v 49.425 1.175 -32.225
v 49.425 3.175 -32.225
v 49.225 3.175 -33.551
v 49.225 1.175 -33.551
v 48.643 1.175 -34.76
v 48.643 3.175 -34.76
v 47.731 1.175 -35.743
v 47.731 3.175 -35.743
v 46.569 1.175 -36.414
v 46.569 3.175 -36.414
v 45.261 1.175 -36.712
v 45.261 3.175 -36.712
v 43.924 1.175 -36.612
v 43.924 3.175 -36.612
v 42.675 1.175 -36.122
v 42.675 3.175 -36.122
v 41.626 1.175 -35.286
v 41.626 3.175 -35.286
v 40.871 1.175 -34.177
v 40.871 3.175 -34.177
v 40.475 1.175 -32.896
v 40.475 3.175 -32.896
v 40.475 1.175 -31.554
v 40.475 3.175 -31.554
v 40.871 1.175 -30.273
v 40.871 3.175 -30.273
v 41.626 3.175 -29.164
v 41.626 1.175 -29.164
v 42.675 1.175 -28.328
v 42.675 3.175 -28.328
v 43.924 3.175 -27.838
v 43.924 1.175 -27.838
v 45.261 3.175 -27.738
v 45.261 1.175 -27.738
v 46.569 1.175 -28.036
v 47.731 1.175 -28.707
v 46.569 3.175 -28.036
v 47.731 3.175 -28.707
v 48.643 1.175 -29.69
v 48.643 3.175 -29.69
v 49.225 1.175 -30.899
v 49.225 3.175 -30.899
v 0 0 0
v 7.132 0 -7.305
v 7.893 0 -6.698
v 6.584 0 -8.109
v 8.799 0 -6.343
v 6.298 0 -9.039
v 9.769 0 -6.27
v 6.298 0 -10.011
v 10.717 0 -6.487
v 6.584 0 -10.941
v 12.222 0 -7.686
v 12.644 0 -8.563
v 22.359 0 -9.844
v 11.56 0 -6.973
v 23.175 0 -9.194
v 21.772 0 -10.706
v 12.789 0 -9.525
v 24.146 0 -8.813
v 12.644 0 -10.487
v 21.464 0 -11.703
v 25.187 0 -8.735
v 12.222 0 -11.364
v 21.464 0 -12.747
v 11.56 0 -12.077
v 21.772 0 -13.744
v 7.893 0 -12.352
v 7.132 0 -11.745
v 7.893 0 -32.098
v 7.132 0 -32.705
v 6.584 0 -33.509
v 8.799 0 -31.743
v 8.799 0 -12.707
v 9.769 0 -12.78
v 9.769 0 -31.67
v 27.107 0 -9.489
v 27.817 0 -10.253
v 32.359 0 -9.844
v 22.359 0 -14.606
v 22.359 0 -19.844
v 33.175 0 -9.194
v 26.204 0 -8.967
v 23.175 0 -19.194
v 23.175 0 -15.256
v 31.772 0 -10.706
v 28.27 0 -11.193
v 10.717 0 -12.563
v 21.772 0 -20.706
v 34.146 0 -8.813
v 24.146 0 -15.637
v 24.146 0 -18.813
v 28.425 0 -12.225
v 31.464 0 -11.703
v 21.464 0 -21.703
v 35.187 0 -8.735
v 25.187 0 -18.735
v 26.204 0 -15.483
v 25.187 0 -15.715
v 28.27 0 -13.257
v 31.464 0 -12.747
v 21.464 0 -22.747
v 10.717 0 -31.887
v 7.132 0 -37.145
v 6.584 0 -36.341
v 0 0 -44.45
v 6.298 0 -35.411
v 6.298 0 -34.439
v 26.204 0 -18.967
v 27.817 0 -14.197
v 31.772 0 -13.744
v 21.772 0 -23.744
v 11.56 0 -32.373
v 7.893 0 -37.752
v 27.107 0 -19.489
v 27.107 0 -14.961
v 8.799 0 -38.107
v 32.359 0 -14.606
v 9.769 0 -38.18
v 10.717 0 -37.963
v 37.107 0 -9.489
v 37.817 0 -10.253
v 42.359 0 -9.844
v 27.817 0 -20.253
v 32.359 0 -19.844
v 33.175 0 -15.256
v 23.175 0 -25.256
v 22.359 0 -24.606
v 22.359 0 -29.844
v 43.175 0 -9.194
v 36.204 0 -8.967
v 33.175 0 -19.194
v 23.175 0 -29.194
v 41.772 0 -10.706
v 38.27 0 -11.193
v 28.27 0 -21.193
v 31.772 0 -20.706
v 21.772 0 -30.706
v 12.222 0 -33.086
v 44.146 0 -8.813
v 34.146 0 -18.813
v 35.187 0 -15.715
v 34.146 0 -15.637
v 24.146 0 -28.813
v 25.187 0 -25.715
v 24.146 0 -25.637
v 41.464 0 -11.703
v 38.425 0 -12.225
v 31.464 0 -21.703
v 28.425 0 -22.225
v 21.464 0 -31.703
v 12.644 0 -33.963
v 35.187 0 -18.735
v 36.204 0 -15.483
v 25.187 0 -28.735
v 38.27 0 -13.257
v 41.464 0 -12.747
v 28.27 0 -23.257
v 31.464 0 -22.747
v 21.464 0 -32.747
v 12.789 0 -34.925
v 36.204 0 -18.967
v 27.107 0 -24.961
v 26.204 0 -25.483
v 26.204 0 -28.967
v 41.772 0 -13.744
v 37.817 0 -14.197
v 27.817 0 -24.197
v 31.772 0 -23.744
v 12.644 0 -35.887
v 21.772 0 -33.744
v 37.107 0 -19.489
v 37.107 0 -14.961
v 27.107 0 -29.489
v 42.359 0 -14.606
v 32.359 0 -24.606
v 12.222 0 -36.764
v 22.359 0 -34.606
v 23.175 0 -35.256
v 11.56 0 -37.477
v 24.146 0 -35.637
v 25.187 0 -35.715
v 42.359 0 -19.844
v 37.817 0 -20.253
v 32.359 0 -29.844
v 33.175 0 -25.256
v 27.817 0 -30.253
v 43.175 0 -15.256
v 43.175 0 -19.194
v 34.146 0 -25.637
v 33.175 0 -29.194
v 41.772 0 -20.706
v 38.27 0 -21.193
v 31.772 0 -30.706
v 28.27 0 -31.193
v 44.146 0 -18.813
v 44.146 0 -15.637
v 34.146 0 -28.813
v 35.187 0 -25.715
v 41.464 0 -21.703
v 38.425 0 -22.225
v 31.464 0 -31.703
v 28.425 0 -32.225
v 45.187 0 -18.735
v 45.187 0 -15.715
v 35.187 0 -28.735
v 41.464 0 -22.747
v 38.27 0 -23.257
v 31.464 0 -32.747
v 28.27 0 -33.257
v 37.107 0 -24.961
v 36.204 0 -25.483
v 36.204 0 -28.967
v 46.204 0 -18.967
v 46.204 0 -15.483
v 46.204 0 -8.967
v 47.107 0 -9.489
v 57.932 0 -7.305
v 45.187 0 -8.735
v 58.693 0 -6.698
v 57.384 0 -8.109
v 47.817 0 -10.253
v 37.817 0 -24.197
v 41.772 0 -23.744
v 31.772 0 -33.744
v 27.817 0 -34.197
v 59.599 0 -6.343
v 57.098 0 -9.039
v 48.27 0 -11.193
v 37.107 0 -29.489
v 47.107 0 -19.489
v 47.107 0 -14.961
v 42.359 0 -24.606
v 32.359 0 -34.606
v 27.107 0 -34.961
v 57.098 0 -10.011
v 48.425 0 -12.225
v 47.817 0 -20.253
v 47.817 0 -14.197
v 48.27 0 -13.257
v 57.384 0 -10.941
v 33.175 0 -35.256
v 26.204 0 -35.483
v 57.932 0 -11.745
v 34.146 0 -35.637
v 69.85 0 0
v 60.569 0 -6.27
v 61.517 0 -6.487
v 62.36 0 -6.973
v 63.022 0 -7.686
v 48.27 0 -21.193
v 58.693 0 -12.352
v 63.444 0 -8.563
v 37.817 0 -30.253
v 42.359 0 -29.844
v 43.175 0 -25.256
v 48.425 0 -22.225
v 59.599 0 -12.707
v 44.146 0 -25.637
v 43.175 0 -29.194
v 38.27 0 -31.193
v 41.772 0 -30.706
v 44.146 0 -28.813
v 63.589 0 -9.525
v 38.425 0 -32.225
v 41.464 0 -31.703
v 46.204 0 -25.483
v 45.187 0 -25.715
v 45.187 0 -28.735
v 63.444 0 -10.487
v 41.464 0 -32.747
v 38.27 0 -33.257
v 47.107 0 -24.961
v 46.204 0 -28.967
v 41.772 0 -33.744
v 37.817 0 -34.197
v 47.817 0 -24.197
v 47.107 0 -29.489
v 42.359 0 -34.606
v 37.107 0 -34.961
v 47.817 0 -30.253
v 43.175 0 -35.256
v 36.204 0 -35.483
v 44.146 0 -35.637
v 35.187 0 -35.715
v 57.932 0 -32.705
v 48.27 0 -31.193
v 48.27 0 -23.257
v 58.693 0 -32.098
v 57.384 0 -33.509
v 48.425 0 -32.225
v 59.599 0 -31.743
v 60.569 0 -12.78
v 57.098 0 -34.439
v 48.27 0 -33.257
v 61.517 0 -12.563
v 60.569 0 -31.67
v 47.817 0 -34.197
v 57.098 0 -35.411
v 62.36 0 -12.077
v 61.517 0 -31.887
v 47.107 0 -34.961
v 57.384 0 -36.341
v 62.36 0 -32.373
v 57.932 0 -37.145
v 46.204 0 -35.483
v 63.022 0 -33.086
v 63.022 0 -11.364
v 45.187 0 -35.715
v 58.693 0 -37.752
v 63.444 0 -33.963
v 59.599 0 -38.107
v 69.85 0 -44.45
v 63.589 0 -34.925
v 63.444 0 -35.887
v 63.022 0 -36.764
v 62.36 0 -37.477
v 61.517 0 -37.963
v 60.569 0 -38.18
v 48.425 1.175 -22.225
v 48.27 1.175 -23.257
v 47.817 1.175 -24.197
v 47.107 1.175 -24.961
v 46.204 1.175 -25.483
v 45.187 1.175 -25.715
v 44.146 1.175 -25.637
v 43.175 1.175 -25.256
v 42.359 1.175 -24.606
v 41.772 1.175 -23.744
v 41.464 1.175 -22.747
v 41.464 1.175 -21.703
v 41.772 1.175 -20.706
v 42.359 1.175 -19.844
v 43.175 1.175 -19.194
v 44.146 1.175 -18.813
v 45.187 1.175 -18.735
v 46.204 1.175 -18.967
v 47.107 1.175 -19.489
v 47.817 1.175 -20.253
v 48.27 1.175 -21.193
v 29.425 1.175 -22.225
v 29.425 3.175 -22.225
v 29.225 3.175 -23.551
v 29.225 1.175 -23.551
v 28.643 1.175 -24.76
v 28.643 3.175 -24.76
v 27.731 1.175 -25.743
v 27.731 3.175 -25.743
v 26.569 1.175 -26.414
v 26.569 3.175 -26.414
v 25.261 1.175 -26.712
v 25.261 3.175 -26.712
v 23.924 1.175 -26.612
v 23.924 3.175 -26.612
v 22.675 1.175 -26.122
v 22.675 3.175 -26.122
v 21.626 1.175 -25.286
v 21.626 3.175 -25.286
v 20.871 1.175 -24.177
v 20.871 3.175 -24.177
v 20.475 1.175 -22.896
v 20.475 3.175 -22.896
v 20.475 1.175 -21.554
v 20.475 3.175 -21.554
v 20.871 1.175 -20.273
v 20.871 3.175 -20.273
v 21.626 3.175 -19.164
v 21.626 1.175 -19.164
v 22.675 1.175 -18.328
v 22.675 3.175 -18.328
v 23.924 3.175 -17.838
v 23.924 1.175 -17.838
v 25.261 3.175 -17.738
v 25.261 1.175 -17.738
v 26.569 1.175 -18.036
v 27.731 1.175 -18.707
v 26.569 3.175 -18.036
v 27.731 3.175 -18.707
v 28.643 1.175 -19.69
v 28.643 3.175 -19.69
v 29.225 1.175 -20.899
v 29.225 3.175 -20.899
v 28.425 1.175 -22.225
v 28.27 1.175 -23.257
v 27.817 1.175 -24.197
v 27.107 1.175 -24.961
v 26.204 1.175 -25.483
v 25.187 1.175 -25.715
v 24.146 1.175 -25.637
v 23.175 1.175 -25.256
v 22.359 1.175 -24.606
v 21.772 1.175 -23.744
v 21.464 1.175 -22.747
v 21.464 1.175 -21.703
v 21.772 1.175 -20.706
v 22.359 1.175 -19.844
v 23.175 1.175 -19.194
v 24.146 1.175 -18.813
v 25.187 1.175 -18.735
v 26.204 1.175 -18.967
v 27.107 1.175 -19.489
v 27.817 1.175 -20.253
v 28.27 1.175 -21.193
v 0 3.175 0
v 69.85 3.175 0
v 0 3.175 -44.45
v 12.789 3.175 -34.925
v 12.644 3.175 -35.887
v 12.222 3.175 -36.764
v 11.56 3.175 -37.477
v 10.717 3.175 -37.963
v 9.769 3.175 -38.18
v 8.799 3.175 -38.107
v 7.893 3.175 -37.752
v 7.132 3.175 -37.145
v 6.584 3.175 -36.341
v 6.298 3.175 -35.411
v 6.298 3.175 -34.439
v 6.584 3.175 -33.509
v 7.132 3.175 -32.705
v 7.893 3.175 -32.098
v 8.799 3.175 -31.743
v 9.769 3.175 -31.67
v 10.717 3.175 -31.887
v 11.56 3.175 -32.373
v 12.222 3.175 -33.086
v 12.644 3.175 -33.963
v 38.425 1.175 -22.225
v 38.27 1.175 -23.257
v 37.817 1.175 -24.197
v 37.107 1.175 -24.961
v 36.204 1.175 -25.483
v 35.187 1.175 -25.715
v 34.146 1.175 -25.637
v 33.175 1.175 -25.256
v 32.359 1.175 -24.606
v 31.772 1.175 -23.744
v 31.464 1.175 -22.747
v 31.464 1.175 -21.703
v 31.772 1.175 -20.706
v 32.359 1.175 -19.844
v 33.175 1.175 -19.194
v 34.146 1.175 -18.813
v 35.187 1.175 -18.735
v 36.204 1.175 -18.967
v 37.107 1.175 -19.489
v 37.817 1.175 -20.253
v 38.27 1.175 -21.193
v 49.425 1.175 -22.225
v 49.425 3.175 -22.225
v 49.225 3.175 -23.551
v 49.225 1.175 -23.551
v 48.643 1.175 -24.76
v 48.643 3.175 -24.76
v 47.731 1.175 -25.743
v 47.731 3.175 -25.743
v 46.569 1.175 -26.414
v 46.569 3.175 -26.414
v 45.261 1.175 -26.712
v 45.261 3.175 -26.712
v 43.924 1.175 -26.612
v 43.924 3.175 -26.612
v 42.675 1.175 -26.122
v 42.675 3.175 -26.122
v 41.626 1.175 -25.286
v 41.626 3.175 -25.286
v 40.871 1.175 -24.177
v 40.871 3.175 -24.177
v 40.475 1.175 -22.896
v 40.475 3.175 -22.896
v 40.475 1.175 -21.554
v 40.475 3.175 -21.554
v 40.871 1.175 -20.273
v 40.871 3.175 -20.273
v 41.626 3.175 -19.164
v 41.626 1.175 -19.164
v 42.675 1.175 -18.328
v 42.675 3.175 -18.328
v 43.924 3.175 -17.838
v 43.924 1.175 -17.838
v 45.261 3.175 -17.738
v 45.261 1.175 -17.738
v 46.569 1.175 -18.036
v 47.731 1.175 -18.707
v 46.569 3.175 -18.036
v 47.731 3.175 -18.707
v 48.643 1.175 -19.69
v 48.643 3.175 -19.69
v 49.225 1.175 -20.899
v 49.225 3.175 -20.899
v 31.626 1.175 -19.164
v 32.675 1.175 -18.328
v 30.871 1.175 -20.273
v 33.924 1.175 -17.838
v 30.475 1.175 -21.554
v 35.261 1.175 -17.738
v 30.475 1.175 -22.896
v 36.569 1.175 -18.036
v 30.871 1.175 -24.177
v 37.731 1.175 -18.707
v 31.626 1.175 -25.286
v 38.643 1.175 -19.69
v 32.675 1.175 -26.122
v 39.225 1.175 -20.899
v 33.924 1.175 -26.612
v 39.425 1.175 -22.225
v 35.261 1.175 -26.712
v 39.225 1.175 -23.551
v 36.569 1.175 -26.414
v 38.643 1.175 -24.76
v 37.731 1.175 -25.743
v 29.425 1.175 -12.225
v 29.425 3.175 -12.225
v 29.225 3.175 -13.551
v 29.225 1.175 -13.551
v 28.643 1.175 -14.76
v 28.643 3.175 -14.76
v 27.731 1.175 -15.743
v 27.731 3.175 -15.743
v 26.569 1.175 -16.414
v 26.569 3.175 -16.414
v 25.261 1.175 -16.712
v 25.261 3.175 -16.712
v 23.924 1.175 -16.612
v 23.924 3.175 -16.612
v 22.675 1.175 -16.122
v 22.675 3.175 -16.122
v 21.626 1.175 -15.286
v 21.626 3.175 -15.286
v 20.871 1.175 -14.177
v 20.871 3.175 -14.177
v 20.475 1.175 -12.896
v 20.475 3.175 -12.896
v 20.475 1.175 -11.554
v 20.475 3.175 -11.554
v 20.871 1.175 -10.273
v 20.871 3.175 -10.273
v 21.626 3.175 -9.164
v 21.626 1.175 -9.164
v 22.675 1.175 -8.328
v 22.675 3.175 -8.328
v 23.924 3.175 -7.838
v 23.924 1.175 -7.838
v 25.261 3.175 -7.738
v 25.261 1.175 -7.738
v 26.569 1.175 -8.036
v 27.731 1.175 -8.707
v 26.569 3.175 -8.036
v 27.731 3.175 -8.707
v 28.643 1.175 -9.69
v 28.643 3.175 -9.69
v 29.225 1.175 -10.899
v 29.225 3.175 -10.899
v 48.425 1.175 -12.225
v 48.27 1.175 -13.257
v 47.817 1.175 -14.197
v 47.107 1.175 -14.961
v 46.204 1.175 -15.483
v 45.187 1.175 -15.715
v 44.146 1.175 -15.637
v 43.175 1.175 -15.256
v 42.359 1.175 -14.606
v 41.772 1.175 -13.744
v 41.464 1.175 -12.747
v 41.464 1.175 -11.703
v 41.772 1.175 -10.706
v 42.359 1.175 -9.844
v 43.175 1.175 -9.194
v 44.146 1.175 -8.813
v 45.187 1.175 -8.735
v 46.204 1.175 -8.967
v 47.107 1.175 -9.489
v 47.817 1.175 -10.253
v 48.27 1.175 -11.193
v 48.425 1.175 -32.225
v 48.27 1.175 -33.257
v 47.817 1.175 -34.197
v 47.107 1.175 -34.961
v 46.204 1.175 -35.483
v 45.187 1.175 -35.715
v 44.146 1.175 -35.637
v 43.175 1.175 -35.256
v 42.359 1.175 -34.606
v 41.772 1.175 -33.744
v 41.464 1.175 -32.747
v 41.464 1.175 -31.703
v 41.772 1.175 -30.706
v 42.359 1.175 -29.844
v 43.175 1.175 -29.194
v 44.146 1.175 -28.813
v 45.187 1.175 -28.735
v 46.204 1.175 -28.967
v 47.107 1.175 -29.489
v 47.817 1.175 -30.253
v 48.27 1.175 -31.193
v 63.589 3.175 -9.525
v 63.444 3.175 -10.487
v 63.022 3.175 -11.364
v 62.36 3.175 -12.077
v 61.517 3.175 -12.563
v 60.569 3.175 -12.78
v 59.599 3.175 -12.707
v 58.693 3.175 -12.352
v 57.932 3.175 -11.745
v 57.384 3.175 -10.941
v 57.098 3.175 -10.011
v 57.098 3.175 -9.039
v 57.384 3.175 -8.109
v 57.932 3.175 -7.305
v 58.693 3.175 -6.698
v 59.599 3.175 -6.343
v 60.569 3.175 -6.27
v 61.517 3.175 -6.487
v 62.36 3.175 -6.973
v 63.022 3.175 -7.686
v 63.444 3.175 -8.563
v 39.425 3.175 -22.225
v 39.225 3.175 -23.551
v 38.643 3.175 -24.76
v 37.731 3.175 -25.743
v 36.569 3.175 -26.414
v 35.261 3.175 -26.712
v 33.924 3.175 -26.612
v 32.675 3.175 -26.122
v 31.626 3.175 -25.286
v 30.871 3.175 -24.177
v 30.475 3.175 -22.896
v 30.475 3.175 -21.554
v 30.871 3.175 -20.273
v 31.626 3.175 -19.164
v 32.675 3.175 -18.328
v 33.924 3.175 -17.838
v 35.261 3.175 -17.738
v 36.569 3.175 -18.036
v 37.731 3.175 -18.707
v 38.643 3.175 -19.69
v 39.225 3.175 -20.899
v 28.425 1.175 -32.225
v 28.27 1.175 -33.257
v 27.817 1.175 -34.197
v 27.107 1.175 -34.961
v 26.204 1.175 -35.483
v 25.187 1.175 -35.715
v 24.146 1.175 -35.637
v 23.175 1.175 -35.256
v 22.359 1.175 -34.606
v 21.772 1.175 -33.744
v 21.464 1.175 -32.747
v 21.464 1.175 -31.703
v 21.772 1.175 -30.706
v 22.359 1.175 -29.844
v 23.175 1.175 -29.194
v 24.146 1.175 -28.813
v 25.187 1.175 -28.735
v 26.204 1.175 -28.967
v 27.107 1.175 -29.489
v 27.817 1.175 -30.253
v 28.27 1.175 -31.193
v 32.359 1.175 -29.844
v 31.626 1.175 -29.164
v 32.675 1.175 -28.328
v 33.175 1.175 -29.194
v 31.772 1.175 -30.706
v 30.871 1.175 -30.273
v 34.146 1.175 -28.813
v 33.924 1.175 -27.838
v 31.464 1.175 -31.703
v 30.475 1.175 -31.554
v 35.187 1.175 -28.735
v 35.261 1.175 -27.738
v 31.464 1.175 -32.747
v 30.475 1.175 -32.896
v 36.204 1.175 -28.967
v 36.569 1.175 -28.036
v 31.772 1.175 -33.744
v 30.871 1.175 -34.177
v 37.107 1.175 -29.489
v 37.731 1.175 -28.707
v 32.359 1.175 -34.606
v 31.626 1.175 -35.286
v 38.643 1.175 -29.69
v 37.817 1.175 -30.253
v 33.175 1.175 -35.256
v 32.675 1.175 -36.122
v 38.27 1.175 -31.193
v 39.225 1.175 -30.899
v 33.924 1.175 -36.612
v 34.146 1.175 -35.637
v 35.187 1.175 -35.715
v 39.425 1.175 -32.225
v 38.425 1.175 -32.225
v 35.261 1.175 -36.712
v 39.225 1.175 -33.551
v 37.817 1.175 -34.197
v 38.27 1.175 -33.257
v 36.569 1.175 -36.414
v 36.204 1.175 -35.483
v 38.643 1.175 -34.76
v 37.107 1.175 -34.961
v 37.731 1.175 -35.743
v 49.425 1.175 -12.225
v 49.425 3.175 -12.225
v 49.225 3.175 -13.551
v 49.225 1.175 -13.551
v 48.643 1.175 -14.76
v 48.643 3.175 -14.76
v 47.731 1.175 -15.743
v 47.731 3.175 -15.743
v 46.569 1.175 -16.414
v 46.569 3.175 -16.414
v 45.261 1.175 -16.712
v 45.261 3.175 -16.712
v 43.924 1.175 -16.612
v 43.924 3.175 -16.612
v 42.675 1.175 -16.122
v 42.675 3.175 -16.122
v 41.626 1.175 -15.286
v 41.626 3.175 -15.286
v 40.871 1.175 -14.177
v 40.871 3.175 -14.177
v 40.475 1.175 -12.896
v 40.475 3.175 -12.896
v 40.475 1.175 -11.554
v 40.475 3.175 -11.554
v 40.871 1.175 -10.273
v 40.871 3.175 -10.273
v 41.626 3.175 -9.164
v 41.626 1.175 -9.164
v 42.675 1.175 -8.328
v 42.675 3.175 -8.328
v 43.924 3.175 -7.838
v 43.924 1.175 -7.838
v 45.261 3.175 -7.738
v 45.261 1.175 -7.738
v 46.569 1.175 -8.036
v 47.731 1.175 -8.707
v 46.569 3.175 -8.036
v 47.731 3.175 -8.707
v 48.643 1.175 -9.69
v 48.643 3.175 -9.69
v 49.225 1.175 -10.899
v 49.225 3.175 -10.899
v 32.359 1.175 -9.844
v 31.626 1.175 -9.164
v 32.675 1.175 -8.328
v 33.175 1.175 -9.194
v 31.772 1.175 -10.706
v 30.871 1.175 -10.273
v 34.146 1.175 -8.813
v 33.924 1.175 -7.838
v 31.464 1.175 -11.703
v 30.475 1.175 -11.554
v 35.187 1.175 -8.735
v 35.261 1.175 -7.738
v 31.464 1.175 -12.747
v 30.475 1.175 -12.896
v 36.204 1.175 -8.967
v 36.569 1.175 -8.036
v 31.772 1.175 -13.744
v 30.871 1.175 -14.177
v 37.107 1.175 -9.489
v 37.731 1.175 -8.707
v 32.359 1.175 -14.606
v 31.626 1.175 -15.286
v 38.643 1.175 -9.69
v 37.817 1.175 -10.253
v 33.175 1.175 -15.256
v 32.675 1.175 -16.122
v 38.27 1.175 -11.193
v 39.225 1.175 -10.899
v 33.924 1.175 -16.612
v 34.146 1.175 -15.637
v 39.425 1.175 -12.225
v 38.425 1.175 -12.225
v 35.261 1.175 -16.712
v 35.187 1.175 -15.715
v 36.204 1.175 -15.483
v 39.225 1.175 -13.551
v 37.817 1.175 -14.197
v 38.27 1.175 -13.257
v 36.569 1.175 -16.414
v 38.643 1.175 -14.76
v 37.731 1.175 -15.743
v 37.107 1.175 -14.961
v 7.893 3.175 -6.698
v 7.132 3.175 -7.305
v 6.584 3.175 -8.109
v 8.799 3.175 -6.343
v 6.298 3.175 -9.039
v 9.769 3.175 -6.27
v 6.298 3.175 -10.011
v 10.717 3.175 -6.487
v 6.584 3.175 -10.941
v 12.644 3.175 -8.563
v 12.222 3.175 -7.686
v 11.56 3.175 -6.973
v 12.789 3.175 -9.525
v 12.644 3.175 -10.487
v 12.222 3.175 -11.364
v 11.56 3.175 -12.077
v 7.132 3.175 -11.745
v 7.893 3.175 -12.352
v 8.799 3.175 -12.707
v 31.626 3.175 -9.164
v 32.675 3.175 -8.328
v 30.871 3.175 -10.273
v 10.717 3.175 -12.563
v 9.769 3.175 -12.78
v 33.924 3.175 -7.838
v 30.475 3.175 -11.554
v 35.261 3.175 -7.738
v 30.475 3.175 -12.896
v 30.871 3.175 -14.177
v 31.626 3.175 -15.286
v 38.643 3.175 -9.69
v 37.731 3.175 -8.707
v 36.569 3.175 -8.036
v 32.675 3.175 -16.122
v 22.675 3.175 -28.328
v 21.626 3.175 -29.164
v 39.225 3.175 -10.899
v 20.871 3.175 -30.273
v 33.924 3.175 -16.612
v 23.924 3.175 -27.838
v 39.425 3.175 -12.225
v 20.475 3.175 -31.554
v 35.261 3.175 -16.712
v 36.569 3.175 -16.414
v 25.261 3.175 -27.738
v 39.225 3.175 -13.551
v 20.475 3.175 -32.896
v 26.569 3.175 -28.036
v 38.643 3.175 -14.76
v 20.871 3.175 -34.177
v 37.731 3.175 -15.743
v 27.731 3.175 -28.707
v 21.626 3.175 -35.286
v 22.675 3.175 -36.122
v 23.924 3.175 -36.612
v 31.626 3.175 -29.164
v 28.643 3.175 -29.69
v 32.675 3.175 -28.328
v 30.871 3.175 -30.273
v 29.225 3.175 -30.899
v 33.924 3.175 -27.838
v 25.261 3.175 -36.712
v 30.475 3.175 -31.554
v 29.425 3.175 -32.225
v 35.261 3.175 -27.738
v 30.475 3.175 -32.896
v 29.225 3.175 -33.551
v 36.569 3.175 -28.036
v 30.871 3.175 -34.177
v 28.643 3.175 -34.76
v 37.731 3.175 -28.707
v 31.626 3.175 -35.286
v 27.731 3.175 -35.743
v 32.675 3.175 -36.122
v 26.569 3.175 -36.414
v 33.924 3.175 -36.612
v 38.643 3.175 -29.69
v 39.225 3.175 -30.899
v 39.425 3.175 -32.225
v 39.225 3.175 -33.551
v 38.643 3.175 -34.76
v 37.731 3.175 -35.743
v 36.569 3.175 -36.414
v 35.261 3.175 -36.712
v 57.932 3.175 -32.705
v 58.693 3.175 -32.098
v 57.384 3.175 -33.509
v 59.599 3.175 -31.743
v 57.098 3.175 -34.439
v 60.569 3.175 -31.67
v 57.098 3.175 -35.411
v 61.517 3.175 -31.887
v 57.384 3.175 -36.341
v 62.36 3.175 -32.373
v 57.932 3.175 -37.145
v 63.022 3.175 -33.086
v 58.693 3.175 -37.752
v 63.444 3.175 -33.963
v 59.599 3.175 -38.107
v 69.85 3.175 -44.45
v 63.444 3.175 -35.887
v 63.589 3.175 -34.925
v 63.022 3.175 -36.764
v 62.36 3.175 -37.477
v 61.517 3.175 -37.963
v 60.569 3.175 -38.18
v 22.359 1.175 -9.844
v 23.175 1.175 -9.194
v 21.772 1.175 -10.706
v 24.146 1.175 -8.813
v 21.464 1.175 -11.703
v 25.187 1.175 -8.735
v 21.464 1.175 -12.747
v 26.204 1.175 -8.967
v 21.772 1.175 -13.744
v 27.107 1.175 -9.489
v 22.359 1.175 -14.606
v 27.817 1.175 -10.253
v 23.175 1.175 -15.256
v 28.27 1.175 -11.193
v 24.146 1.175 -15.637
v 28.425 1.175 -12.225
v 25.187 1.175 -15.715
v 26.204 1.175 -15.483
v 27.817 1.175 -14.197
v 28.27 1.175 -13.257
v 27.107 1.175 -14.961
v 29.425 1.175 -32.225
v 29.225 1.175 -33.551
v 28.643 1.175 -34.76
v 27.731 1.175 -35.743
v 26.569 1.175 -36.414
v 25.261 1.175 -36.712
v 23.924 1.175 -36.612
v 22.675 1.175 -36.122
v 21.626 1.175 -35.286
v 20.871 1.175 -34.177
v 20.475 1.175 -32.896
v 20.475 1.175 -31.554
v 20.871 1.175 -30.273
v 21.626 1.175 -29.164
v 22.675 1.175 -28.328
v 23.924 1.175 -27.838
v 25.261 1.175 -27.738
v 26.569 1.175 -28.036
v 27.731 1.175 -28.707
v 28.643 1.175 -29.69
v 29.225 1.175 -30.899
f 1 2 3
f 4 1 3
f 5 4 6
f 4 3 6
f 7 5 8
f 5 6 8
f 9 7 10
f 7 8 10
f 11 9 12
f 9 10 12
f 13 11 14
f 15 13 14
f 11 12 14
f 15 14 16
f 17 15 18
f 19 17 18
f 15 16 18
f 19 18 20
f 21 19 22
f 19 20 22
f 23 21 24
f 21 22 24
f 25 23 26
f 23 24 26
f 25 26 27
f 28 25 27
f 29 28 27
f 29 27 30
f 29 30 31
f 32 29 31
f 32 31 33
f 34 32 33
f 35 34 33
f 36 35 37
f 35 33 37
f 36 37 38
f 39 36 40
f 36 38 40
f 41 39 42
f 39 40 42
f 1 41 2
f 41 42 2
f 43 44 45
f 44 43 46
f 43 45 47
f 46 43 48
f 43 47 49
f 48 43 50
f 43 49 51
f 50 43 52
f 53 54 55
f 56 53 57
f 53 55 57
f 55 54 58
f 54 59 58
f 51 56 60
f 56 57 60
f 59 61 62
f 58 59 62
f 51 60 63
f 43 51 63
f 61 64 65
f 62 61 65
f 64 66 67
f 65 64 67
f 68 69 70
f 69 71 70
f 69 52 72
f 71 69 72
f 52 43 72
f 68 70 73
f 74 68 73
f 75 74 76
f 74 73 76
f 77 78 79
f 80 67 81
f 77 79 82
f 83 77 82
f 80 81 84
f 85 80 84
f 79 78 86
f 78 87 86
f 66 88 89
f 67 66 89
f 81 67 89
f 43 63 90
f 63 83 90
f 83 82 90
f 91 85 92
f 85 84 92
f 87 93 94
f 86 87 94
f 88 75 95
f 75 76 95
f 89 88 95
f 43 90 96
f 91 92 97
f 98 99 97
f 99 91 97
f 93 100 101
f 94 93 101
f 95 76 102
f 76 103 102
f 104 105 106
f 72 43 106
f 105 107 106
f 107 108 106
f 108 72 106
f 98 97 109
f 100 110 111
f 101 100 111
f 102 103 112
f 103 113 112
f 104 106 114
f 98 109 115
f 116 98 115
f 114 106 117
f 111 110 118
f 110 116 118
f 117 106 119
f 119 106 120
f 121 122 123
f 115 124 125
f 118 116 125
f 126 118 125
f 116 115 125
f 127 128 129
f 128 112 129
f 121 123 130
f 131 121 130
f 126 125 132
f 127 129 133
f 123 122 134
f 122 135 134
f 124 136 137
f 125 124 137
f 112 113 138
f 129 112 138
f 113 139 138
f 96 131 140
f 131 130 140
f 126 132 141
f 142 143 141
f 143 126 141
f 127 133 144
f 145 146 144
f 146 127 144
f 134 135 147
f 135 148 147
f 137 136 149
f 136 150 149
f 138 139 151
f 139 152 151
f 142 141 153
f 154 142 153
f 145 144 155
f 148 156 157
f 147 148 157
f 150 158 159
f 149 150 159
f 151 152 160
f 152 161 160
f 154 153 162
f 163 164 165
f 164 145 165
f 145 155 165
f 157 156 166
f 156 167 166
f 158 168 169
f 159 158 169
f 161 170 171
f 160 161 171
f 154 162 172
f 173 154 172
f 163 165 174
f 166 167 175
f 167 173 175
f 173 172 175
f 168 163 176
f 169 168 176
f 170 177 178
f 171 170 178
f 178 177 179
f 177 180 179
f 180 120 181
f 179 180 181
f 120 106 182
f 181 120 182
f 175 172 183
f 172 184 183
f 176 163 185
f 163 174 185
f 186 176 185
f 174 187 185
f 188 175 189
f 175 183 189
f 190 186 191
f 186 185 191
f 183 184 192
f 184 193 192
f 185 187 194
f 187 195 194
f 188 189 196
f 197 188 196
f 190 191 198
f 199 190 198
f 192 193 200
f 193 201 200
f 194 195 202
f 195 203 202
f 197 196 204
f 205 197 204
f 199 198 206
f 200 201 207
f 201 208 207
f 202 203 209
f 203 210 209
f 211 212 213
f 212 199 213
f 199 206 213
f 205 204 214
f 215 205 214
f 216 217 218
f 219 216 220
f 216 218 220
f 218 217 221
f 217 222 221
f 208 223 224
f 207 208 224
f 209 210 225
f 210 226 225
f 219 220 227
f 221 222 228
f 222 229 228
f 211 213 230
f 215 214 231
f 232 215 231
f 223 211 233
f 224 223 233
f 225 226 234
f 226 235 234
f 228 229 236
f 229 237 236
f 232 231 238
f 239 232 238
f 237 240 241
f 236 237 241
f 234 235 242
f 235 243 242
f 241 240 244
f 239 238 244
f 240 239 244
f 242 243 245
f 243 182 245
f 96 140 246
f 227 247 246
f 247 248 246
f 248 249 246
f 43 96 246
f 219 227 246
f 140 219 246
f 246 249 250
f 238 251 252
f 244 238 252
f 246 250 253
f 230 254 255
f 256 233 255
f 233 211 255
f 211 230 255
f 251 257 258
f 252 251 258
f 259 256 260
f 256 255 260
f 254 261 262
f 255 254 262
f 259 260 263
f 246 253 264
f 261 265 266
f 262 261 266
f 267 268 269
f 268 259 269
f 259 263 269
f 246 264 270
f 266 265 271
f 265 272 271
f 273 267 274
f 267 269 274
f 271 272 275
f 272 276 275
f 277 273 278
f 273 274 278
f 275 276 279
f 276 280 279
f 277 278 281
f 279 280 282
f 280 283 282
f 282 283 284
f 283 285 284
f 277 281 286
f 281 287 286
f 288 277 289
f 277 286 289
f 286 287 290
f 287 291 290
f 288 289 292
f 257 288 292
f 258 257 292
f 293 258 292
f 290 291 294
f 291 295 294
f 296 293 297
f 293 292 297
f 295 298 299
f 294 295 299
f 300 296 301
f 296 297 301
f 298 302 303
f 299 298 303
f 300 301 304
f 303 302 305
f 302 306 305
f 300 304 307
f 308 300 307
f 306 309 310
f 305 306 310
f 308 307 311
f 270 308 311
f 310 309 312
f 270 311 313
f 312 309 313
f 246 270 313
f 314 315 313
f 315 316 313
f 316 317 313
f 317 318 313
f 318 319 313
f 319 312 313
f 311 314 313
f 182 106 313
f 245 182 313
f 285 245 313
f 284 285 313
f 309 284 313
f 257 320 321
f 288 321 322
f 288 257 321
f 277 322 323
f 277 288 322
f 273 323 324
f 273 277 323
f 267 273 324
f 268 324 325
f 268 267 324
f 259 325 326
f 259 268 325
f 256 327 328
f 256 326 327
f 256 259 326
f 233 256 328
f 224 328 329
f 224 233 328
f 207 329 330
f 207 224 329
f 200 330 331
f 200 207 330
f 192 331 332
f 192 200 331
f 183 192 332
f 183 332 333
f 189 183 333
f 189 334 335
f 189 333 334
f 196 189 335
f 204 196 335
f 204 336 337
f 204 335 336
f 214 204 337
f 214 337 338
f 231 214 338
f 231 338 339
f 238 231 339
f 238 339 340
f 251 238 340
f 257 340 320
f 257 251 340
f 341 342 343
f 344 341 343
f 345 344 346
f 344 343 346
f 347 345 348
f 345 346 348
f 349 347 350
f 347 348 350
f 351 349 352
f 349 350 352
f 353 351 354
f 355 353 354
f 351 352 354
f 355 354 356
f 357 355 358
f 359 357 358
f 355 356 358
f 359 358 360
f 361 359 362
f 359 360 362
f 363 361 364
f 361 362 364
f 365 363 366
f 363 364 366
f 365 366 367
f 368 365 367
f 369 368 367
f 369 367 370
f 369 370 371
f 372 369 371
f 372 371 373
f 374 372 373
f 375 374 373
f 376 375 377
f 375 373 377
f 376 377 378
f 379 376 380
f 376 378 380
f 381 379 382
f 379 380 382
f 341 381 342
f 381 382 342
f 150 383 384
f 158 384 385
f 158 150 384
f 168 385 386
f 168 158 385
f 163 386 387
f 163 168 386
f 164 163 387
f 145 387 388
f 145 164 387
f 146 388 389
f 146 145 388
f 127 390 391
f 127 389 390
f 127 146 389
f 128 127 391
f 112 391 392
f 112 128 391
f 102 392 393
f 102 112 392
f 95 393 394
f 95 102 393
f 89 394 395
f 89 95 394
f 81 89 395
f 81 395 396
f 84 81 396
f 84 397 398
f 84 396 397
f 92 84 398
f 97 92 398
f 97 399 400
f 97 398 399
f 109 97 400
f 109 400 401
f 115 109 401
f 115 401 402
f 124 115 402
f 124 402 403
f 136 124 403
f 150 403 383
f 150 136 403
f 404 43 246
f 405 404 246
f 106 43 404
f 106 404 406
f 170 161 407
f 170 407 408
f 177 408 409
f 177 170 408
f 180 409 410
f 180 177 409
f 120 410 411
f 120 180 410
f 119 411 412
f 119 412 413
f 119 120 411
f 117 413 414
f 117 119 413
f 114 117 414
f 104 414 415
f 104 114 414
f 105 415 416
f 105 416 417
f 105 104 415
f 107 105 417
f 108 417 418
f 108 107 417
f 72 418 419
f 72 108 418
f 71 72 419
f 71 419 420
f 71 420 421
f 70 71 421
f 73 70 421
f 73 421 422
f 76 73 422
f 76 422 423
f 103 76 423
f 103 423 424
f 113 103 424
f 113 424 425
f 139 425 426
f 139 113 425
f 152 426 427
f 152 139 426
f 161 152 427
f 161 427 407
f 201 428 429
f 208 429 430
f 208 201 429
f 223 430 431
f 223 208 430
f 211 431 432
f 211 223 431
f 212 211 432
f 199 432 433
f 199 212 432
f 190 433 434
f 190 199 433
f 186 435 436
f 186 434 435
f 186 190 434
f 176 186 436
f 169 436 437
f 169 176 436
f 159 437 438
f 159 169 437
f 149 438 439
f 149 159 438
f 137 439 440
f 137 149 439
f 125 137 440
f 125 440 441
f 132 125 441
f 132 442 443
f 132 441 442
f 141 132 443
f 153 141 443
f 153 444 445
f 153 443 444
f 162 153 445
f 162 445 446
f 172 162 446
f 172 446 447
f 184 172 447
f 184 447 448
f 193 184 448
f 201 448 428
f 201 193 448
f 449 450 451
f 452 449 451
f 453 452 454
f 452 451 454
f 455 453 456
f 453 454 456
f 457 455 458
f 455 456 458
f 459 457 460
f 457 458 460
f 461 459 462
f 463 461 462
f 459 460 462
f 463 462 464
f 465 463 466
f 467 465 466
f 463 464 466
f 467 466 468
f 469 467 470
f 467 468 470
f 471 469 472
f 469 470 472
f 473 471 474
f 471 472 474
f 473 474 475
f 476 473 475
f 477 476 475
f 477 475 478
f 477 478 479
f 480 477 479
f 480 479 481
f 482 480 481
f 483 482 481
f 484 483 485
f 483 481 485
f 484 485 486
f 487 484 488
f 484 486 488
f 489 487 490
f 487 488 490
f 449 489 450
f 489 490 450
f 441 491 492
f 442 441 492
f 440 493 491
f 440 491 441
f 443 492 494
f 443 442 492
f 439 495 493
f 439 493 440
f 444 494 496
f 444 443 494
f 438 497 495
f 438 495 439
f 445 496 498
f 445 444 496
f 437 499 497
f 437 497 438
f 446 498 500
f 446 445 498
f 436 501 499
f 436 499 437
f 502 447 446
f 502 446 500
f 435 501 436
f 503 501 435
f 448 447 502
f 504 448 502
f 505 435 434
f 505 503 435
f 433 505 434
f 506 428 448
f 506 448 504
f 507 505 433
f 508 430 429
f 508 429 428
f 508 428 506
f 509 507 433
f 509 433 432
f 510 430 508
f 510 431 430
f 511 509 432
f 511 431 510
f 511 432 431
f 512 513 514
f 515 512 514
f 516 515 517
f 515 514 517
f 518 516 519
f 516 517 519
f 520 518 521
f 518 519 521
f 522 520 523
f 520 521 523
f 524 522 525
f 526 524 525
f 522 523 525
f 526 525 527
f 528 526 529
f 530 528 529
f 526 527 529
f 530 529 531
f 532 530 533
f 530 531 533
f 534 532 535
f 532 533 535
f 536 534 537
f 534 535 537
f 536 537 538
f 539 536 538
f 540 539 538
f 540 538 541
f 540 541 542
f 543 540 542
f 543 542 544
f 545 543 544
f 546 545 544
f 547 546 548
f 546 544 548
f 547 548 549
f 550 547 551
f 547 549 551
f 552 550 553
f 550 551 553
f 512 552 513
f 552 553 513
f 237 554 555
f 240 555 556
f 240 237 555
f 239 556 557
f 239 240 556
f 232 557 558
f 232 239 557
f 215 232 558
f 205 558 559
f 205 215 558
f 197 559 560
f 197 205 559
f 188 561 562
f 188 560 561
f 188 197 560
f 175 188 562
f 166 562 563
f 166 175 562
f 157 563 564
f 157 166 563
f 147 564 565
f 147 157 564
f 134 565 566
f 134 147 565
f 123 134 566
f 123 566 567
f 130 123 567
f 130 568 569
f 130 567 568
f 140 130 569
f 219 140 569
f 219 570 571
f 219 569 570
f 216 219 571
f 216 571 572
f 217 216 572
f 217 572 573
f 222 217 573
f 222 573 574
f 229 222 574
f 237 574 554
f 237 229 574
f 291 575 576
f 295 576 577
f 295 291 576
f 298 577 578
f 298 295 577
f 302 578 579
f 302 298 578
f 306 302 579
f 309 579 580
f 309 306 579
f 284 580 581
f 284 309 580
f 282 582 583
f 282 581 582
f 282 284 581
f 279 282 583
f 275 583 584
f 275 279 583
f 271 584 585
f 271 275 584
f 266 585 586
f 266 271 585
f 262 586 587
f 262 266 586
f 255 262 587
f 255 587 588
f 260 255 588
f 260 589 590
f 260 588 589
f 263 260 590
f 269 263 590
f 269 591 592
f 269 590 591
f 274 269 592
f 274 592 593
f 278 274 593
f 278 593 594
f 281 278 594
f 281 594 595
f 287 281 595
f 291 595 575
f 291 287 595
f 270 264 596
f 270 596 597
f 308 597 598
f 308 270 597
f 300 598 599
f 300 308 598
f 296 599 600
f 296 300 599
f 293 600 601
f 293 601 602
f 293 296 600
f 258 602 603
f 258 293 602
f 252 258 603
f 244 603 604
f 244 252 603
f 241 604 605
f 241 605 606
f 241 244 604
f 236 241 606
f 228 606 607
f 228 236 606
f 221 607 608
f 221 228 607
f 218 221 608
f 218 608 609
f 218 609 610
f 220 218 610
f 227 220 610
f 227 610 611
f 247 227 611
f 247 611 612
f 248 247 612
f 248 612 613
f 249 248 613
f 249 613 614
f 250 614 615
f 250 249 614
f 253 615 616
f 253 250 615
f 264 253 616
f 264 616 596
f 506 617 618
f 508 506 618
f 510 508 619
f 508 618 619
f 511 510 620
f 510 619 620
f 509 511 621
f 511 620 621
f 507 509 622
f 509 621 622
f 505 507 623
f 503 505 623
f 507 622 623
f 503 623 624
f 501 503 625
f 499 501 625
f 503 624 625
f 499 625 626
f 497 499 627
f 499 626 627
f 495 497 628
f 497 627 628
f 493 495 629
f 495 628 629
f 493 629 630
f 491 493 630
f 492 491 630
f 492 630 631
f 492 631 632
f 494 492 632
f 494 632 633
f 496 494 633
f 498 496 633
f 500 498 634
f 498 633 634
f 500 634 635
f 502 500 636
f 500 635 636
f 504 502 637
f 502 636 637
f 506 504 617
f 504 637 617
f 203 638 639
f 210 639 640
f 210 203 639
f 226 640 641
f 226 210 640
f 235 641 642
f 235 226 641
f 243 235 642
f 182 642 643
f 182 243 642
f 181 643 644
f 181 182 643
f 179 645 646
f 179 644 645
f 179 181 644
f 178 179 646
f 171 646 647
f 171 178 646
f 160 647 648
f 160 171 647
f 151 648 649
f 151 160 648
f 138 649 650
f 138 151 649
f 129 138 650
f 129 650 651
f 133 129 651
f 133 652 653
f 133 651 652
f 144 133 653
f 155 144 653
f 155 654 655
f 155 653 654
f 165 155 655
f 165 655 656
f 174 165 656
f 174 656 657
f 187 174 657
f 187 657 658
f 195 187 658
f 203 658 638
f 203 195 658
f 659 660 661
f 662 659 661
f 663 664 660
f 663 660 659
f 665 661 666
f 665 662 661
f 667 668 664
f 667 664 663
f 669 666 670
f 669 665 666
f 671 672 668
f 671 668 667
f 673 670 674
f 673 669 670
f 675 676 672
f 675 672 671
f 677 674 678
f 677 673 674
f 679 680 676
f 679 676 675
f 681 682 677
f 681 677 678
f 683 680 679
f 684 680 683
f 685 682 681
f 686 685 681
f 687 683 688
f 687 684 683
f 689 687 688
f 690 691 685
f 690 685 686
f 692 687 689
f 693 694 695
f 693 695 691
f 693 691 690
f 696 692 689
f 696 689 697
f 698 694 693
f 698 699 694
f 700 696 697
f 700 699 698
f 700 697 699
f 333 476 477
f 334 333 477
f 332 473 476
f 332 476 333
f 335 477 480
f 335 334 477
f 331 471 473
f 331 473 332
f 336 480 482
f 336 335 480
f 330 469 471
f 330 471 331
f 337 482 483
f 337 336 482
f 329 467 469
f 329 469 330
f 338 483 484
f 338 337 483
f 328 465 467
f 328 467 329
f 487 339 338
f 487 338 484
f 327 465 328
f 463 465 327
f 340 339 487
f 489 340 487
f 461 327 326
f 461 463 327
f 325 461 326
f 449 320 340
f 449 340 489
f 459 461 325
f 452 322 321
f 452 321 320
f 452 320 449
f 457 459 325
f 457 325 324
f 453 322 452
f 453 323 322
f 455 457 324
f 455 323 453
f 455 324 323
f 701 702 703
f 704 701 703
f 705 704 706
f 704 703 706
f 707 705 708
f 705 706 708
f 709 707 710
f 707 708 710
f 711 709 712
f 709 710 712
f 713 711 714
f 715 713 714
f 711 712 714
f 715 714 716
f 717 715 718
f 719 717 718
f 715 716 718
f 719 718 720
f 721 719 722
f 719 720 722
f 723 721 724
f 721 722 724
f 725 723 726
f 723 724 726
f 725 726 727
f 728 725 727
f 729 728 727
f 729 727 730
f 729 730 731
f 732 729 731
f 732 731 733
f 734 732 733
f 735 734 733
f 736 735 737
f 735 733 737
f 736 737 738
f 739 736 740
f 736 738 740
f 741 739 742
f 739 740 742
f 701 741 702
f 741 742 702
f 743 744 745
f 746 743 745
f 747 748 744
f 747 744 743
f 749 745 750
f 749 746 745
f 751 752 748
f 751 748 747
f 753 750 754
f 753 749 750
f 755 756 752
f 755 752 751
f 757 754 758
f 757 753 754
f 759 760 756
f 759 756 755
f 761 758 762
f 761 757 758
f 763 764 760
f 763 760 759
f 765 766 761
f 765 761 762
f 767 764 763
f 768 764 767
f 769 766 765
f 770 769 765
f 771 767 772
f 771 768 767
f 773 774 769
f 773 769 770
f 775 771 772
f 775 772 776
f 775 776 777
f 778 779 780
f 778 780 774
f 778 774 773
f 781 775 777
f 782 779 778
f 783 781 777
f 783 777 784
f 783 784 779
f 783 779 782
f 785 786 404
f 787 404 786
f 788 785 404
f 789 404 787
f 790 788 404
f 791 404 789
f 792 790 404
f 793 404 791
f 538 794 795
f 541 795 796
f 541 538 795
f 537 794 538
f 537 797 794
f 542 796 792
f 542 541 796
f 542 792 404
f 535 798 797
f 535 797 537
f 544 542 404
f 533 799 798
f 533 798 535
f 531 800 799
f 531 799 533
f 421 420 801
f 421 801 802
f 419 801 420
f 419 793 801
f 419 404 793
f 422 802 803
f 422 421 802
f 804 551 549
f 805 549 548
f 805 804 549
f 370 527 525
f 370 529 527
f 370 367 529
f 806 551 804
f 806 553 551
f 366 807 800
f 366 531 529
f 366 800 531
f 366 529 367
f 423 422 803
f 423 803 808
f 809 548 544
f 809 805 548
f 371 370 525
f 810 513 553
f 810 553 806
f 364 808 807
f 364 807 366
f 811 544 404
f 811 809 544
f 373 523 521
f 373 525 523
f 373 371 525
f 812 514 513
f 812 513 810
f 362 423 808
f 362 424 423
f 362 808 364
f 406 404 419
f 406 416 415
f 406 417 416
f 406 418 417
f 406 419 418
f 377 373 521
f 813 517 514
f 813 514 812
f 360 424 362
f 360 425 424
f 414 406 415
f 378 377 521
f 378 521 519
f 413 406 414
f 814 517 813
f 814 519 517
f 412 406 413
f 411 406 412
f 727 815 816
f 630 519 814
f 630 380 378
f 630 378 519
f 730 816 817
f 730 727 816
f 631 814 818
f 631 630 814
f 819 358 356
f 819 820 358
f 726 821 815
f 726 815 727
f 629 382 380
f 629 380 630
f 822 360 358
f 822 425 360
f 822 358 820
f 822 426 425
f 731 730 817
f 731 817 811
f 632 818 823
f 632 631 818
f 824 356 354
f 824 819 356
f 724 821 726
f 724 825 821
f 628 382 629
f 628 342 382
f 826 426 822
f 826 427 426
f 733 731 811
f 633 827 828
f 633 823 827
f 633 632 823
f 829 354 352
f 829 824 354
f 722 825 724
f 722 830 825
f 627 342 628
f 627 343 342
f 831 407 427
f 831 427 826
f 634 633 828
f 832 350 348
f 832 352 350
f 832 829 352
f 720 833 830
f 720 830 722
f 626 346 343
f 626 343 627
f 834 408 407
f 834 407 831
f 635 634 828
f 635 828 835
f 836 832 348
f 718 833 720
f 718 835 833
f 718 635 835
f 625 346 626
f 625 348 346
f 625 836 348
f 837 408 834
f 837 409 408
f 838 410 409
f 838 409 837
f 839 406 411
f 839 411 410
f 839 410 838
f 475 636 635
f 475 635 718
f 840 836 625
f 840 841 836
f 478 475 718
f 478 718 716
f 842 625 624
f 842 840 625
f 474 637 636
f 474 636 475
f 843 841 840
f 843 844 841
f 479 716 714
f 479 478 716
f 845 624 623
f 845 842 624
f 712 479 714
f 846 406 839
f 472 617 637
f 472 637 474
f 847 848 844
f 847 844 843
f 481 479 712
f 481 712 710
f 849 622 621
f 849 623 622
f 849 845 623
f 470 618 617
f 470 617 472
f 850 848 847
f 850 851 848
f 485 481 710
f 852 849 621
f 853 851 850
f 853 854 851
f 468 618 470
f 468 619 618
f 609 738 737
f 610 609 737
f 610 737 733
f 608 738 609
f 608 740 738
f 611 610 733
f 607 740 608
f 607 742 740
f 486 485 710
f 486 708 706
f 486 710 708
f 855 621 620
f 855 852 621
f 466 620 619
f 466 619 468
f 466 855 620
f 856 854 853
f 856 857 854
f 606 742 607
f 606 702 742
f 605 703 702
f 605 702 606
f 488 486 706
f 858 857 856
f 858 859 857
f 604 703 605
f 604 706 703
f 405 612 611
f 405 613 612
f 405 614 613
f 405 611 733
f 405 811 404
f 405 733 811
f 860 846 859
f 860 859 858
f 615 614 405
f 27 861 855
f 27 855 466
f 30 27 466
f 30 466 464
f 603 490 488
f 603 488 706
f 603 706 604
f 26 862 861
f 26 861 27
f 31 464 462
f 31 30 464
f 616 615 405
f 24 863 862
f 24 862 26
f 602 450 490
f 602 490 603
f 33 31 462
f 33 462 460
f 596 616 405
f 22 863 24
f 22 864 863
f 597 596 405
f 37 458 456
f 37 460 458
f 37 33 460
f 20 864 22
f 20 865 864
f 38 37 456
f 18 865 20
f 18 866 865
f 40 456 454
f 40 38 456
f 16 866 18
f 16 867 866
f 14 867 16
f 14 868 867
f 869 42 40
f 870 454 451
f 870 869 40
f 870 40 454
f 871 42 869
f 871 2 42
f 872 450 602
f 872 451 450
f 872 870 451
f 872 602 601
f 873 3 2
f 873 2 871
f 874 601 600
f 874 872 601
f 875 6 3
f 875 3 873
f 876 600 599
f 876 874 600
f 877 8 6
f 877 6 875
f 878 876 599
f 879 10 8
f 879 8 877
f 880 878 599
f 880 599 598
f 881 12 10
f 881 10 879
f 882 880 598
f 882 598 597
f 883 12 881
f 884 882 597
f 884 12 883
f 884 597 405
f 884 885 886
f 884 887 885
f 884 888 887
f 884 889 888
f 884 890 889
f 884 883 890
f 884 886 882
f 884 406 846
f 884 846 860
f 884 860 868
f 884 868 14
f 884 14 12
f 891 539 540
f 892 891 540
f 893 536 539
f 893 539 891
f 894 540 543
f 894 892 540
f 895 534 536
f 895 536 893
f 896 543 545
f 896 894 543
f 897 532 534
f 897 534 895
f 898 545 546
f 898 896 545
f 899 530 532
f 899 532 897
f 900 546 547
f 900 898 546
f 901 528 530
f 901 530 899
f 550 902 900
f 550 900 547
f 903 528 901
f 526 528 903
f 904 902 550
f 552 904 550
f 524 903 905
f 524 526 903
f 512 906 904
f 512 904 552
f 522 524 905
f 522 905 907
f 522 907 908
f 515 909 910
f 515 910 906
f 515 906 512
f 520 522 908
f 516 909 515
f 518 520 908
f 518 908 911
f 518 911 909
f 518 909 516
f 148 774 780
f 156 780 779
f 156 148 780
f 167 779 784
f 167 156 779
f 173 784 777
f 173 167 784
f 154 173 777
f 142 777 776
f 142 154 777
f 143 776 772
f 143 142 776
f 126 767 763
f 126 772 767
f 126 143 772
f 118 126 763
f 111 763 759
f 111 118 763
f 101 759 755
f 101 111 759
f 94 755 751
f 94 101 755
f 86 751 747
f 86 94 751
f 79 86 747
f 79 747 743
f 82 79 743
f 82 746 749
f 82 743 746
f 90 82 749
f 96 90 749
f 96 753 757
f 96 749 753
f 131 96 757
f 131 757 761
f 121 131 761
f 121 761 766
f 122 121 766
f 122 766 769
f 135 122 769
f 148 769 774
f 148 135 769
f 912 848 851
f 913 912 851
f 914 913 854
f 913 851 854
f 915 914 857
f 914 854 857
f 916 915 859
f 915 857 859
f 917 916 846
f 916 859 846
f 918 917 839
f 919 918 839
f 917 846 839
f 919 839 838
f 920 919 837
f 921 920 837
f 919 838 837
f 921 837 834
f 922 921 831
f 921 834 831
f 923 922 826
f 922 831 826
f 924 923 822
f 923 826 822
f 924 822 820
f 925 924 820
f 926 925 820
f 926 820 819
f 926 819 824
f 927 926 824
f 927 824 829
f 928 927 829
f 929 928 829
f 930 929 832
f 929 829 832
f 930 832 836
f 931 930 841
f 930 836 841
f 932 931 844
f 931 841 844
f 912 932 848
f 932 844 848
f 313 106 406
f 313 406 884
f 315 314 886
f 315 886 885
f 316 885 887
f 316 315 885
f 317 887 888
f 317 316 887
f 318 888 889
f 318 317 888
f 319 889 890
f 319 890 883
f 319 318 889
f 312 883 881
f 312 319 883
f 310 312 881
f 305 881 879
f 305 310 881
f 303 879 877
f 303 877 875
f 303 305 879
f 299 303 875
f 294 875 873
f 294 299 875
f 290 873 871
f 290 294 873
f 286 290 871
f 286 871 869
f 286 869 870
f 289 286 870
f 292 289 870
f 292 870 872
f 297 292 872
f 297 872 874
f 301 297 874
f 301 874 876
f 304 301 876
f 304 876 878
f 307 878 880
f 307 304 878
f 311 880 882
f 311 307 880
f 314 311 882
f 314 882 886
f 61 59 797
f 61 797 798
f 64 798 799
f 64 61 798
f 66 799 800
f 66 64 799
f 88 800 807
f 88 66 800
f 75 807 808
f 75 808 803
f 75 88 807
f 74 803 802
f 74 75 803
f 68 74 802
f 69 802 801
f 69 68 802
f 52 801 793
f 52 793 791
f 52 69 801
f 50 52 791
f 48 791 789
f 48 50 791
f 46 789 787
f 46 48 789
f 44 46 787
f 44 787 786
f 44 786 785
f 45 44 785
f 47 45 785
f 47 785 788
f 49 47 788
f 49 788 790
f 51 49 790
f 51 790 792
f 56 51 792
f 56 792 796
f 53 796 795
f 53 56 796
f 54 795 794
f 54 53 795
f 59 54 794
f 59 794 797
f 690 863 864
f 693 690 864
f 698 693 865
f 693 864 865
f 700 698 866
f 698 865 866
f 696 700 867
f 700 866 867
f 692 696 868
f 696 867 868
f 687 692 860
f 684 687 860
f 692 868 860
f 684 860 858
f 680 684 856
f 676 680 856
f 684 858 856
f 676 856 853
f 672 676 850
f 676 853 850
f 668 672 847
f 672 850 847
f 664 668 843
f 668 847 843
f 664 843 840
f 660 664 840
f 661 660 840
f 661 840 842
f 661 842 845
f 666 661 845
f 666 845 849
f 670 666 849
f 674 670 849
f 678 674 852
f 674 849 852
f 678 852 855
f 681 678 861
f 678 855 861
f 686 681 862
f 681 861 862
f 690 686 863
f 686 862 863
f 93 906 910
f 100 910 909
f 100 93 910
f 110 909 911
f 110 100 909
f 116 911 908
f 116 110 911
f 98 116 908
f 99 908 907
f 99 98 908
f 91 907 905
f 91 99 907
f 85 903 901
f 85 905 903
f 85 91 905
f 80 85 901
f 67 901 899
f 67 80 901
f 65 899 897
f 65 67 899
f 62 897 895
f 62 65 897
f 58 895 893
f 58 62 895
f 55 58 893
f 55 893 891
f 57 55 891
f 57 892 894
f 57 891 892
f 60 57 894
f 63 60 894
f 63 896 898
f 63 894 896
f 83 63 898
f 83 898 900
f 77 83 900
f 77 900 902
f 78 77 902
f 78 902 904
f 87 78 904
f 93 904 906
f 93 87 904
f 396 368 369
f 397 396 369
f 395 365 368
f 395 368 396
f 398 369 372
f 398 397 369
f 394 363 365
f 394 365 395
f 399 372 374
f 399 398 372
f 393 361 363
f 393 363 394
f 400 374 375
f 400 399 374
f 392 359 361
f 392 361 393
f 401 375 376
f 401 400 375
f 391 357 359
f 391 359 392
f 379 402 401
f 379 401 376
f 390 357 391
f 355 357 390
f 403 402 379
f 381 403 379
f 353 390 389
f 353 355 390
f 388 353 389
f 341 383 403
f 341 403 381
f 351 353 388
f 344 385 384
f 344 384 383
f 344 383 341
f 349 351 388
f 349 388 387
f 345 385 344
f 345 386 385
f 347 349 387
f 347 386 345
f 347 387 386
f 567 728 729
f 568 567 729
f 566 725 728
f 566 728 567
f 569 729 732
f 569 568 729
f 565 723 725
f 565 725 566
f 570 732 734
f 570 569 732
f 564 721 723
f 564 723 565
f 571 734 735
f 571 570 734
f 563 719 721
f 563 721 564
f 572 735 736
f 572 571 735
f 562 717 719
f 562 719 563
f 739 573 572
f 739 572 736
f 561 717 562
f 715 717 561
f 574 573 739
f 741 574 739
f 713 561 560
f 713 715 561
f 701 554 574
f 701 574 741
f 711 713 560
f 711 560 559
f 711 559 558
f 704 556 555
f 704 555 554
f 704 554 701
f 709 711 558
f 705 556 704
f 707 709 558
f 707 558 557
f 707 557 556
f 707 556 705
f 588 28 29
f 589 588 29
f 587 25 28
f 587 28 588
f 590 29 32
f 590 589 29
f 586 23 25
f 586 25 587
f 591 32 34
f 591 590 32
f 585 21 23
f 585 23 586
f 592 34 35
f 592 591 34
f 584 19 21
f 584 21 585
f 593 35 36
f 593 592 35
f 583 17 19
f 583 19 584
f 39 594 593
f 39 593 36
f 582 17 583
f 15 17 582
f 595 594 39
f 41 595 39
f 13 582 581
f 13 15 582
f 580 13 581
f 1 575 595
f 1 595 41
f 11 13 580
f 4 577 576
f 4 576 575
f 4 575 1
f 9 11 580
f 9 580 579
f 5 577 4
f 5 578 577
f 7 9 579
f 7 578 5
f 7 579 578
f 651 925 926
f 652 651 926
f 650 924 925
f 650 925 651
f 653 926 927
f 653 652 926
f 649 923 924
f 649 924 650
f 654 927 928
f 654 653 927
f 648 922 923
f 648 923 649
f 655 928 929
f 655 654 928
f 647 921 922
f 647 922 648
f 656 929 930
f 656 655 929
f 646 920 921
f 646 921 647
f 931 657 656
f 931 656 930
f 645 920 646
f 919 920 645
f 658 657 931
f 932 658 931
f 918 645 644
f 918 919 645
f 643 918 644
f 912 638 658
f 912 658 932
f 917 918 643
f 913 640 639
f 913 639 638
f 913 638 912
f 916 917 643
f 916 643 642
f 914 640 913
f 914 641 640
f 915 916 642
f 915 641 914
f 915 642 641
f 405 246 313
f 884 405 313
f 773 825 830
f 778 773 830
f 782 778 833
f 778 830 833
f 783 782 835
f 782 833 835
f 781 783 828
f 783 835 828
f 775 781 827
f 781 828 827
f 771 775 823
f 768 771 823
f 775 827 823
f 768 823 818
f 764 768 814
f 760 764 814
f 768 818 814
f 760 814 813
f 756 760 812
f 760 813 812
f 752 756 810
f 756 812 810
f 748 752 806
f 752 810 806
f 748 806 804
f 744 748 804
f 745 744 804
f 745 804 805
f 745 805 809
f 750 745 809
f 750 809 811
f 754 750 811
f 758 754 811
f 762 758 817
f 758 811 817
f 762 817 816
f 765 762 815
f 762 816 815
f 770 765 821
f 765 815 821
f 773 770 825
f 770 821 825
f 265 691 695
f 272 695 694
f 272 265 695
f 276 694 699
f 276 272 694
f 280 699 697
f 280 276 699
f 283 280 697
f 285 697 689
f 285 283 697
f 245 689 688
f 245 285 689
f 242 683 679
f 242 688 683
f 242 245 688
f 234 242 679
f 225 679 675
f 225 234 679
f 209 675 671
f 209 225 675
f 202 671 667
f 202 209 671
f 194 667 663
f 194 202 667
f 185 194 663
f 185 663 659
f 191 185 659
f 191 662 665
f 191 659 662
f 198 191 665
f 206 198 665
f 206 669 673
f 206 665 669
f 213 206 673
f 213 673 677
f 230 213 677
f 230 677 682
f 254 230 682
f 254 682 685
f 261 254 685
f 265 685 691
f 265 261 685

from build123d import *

# Parameters (mm, degrees)
SKETCH1_W           = 69.85
SKETCH1_H           = 44.45
SKETCH1_R           = 3.2639
SKETCH1_R_2         = 3.5
BOSS_EXTRUDE1_DEPTH = 3.175
SKETCH2_R           = 4.5
CUT_EXTRUDE1_DEPTH  = 2


with BuildPart() as part:
    # Sketch1 → Boss-Extrude1 (new body)
    with BuildSketch(Plane(origin=(0, 0, 0), x_dir=(1, 0, 0), z_dir=(0, 1, 0))):
        with Locations((34.925, 22.225)):
            Rectangle(SKETCH1_W, SKETCH1_H)
        with Locations((9.525, 34.925)):
            Circle(SKETCH1_R, mode=Mode.SUBTRACT)
        with Locations((60.325, 34.925)):
            Circle(SKETCH1_R, mode=Mode.SUBTRACT)
        with Locations((9.525, 9.525)):
            Circle(SKETCH1_R, mode=Mode.SUBTRACT)
        with Locations((60.325, 9.525)):
            Circle(SKETCH1_R, mode=Mode.SUBTRACT)
        with Locations((44.925, 32.225)):
            Circle(SKETCH1_R_2, mode=Mode.SUBTRACT)
        with Locations((34.925, 32.225)):
            Circle(SKETCH1_R_2, mode=Mode.SUBTRACT)
        with Locations((24.925, 32.225)):
            Circle(SKETCH1_R_2, mode=Mode.SUBTRACT)
        with Locations((34.925, 22.225)):
            Circle(SKETCH1_R_2, mode=Mode.SUBTRACT)
        with Locations((24.925, 22.225)):
            Circle(SKETCH1_R_2, mode=Mode.SUBTRACT)
        with Locations((34.925, 12.225)):
            Circle(SKETCH1_R_2, mode=Mode.SUBTRACT)
        with Locations((24.925, 12.225)):
            Circle(SKETCH1_R_2, mode=Mode.SUBTRACT)
        with Locations((44.925, 22.225)):
            Circle(SKETCH1_R_2, mode=Mode.SUBTRACT)
        with Locations((44.925, 12.225)):
            Circle(SKETCH1_R_2, mode=Mode.SUBTRACT)
    extrude(amount=BOSS_EXTRUDE1_DEPTH)

    # Sketch2 → Cut-Extrude1 (cut)
    with BuildSketch(Plane(origin=(0, 3.175, 0), x_dir=(1, 0, 0), z_dir=(0, 1, 0))):
        with Locations((44.925, 12.225)):
            Circle(SKETCH2_R)
        with Locations((34.925, 12.225)):
            Circle(SKETCH2_R)
        with Locations((24.925, 12.225)):
            Circle(SKETCH2_R)
        with Locations((34.925, 22.225)):
            Circle(SKETCH2_R)
        with Locations((24.925, 22.225)):
            Circle(SKETCH2_R)
        with Locations((34.925, 32.225)):
            Circle(SKETCH2_R)
        with Locations((24.925, 32.225)):
            Circle(SKETCH2_R)
        with Locations((44.925, 22.225)):
            Circle(SKETCH2_R)
        with Locations((44.925, 32.225)):
            Circle(SKETCH2_R)
    extrude(amount=-CUT_EXTRUDE1_DEPTH, mode=Mode.SUBTRACT)


solid = part.part
